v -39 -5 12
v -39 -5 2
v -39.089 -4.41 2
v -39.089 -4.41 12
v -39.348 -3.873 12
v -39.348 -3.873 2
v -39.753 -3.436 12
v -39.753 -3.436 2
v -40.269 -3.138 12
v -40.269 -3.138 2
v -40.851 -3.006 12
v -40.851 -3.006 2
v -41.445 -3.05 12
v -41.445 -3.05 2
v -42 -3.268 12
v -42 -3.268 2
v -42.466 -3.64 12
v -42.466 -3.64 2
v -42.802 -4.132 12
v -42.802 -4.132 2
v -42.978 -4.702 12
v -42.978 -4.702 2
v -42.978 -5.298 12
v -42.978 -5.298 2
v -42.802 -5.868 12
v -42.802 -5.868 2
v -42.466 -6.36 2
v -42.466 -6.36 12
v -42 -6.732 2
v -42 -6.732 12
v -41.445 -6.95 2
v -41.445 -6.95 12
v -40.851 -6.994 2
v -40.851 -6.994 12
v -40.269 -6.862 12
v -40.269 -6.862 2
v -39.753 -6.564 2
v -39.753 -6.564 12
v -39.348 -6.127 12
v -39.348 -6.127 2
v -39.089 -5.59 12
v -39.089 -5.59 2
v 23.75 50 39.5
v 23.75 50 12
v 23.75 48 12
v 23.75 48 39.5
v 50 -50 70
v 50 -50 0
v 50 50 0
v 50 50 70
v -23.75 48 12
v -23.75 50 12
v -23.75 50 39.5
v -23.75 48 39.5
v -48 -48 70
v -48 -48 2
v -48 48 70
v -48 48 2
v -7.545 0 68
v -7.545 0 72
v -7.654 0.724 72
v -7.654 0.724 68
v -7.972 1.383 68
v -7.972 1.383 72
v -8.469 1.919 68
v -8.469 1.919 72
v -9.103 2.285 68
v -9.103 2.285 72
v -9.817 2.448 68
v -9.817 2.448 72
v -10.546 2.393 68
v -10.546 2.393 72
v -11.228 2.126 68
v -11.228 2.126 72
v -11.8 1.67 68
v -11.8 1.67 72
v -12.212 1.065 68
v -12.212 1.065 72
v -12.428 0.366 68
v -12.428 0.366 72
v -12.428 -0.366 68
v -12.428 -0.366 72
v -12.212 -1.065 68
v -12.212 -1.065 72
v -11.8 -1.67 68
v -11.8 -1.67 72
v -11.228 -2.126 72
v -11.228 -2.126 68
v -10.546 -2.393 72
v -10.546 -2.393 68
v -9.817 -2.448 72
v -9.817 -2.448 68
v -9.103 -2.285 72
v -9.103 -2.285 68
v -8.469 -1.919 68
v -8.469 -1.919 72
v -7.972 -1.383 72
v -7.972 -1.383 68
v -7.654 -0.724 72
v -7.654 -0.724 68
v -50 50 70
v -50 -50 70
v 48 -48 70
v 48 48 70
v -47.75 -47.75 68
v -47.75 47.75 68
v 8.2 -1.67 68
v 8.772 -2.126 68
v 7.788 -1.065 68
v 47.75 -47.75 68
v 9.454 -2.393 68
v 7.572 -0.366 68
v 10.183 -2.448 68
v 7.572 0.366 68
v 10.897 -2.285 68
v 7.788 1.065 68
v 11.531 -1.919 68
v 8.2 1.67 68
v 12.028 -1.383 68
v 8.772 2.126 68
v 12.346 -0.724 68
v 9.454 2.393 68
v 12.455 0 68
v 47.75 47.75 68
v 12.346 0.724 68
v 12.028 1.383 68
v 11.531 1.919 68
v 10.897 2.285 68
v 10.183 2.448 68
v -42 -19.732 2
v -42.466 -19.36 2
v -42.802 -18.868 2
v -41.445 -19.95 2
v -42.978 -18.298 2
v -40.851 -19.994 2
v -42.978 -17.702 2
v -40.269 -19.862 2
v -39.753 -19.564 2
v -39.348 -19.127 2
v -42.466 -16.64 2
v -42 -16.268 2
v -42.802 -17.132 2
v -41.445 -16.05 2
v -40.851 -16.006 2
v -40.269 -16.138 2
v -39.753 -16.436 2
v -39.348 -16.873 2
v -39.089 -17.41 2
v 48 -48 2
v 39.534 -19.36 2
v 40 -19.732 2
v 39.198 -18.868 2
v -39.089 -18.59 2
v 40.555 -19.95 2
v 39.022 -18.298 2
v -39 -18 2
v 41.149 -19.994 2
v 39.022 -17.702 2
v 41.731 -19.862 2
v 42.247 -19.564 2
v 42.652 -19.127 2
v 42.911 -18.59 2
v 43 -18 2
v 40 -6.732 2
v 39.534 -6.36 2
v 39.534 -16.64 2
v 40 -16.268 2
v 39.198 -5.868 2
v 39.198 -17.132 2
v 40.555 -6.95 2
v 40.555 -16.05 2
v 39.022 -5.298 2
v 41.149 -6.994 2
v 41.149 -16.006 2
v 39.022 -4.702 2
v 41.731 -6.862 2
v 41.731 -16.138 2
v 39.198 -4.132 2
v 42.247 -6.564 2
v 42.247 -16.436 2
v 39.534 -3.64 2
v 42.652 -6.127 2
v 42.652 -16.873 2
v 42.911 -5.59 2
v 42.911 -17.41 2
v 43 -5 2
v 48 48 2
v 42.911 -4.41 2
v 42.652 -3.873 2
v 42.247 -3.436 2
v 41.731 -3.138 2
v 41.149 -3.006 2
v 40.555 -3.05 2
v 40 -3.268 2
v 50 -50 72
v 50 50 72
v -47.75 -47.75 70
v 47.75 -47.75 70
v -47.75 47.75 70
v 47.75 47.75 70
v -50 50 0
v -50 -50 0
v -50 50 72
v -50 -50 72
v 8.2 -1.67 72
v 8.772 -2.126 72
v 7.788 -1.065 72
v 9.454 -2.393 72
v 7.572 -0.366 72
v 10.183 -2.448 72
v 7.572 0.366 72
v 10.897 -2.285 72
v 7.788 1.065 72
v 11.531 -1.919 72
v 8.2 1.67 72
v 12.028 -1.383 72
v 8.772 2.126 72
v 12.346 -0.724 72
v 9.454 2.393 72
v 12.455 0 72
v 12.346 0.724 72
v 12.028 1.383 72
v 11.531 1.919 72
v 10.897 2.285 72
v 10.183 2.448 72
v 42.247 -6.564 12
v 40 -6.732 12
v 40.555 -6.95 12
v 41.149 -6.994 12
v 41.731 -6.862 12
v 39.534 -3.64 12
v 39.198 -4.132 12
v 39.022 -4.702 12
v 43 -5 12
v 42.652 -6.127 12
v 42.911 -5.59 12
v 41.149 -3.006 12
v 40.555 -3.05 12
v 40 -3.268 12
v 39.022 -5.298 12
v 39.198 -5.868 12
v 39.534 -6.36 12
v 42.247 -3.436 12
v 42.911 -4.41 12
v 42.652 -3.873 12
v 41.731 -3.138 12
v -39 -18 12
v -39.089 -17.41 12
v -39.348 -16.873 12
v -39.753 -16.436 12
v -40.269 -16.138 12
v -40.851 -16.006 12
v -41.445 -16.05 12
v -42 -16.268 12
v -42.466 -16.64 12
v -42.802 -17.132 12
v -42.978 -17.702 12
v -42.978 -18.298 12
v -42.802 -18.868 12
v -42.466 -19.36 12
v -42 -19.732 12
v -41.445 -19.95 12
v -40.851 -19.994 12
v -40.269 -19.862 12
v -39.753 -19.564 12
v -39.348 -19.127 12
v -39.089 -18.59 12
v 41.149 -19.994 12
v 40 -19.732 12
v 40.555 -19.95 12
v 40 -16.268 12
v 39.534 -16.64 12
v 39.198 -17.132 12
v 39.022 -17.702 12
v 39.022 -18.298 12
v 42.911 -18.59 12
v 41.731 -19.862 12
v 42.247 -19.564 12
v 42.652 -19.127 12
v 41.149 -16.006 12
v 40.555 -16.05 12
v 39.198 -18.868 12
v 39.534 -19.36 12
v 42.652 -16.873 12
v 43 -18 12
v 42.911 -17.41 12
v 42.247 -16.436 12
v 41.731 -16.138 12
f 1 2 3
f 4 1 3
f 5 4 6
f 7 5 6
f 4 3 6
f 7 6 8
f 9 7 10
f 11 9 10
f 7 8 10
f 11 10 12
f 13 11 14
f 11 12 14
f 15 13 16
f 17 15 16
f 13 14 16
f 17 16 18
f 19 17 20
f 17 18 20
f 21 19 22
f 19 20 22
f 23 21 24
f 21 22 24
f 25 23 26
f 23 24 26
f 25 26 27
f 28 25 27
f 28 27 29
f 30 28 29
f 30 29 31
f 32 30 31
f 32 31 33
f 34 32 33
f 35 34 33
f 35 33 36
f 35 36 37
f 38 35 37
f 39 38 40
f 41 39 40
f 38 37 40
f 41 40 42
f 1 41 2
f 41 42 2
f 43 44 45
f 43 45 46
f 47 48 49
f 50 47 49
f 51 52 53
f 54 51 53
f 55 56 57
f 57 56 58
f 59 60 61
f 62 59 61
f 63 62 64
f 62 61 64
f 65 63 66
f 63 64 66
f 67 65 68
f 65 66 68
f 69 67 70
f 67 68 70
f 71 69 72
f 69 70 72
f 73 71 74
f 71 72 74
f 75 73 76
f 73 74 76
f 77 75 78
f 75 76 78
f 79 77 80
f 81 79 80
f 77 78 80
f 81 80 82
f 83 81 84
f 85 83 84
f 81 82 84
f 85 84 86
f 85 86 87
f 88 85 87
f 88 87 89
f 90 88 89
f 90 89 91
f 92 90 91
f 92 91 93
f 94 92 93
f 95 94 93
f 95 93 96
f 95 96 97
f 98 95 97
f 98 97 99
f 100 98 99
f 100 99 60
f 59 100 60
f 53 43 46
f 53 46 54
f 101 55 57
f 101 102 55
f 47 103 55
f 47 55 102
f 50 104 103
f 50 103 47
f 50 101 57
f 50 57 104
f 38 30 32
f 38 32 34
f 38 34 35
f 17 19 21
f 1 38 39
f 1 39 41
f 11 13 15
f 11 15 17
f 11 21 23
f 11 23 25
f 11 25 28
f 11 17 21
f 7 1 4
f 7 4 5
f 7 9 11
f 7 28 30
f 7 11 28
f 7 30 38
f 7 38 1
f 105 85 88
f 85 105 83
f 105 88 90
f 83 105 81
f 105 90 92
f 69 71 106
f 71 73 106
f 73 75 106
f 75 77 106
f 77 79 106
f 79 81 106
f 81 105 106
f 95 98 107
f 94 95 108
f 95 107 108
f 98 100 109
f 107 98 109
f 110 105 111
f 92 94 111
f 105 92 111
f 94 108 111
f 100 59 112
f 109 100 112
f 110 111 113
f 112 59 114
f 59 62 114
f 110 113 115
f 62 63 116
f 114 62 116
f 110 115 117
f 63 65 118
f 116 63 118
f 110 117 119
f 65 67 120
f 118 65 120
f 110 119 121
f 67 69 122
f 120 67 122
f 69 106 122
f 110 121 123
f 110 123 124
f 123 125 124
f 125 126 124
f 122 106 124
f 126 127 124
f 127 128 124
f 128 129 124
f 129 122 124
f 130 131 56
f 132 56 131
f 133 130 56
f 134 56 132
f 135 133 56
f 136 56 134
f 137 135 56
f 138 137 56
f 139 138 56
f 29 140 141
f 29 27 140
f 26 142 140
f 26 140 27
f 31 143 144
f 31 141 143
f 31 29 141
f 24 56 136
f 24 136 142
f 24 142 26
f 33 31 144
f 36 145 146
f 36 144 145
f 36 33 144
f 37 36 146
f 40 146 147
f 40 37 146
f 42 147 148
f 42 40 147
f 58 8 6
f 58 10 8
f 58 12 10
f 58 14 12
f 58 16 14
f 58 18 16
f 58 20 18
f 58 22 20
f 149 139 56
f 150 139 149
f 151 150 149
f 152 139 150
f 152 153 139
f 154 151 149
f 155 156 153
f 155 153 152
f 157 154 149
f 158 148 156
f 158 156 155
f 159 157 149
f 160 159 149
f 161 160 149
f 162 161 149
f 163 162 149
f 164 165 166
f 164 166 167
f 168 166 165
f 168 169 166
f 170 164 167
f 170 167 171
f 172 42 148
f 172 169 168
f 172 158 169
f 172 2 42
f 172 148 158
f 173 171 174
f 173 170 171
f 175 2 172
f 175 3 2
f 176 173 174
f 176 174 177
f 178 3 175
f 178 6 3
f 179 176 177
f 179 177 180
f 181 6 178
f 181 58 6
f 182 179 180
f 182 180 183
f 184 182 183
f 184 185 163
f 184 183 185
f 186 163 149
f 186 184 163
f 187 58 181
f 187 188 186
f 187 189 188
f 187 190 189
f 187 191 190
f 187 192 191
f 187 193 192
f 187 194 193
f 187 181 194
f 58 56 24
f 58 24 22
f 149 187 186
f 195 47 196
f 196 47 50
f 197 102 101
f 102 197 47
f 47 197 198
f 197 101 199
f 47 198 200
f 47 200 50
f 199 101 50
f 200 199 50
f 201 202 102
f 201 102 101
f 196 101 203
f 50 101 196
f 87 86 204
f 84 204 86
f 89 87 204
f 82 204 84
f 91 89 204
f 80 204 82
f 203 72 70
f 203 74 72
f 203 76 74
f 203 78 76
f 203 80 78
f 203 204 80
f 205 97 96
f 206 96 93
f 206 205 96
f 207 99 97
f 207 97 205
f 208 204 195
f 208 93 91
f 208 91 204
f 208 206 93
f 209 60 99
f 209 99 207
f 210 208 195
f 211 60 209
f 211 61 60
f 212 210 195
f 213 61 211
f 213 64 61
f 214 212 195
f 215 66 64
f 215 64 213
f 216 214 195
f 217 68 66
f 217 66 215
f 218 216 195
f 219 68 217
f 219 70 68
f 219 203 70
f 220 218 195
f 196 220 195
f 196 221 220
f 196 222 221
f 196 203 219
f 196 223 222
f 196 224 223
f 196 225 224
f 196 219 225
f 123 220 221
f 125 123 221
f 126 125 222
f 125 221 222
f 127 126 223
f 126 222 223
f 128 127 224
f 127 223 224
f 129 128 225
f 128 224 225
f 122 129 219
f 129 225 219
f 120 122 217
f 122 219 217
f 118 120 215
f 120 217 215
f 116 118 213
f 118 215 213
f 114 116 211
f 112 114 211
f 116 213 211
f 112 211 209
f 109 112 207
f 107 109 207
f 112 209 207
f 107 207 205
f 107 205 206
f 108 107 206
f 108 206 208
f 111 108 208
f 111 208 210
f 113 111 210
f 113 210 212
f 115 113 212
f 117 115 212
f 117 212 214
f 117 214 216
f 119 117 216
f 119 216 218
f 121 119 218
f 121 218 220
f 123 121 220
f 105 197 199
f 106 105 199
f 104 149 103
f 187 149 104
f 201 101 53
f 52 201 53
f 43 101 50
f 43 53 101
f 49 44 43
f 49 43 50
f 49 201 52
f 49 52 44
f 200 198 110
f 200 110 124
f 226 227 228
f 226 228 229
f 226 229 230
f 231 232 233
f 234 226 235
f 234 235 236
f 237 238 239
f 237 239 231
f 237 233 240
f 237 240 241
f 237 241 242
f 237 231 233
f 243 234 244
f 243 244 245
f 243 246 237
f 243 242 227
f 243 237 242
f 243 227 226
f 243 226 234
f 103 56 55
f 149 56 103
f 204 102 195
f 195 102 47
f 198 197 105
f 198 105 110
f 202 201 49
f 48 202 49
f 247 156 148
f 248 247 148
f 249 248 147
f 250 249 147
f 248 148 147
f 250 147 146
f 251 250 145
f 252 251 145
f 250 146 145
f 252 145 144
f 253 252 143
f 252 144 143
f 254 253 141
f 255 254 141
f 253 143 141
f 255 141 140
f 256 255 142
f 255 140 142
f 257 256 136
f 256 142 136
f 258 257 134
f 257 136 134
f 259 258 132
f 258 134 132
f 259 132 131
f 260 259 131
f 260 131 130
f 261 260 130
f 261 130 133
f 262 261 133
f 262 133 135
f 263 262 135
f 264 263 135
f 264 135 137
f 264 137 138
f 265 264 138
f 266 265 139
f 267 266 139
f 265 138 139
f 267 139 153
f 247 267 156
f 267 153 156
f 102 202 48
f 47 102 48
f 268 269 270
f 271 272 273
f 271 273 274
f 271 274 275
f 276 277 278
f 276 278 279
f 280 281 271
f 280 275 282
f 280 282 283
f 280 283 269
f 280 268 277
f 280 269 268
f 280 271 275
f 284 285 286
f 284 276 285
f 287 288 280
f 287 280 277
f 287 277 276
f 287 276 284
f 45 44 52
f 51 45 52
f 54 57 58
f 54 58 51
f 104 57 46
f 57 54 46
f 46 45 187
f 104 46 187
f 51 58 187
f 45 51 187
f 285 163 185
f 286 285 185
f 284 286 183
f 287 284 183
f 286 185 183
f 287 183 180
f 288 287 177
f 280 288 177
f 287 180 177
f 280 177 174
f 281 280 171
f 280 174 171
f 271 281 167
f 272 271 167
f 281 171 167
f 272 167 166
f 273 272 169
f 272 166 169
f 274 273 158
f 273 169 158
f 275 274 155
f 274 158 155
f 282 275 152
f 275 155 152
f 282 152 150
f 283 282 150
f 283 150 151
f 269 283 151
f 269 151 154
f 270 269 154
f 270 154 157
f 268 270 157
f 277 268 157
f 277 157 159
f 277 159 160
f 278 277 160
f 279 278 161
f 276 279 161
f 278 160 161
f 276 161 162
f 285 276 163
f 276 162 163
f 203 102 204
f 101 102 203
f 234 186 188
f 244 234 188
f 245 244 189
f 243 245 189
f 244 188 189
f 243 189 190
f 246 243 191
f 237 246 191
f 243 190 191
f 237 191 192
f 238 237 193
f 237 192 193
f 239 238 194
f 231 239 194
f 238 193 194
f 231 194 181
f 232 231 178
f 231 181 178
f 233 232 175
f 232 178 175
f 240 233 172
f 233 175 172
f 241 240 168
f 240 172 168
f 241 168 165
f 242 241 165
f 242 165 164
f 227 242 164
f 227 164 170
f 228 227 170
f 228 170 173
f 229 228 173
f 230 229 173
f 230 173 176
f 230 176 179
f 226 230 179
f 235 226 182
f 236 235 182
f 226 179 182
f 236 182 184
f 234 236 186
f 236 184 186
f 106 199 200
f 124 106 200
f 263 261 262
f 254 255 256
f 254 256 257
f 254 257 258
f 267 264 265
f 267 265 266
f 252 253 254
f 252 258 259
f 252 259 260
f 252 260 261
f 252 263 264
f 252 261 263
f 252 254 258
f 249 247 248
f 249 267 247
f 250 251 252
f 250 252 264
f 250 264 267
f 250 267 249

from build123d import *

# Parameters (mm, degrees)
F0_W      = 100
F0_H      = 100
F1_DEPTH  = 70
F2_T      = -2
F3_R      = 2
F4_DEPTH  = 10
F5_W      = 47.5
F5_H      = 27.5
F6_DEPTH  = 25
F7_W      = 95.5
F7_H      = 95.5
F8_DEPTH  = 2
F9_W      = 100
F9_H      = 100
F10_DEPTH = 2
F11_R     = 2.455
F12_DEPTH = 25


with BuildPart() as f1:
    # F0 (on Top) → F1 (new body)
    with BuildSketch(Plane.XY):
        Rectangle(F0_W, F0_H)
    extrude(amount=F1_DEPTH)

    # F2
    f2_openings = [f1.faces().sort_by_distance(p)[0] for p in [
        (0, 0, 70),
    ]]
    offset(amount=F2_T, openings=f2_openings)

    # F3 (on face) → F4 (join)
    with BuildSketch(Plane.XY.offset(2)):
        with Locations((-41, -5)):
            Circle(F3_R)
        with Locations((-41, -18)):
            Circle(F3_R)
        with Locations((41, -5)):
            Circle(F3_R)
        with Locations((41, -18)):
            Circle(F3_R)
    extrude(amount=F4_DEPTH)

    # F5 (on face) → F6 (cut)
    with BuildSketch(Plane(origin=(0, 50, 0), x_dir=(-1, 0, 0), z_dir=(0, 1, 0))):
        with Locations((0, 25.75)):
            Rectangle(F5_W, F5_H)
    extrude(amount=-F6_DEPTH, mode=Mode.SUBTRACT)


with BuildPart() as f8:
    # F7 (on face) → F8 (new body)
    with BuildSketch(Plane.XY.offset(70)):
        Rectangle(F7_W, F7_H)
    extrude(amount=-F8_DEPTH)

    # F9 (on face) → F10 (join)
    with BuildSketch(Plane.XY.offset(70)):
        Rectangle(F9_W, F9_H)
    extrude(amount=F10_DEPTH)

    # F11 (on face) → F12 (cut)
    with BuildSketch(Plane.XY.offset(72)):
        with Locations((10, 0)):
            Circle(F11_R)
        with Locations((-10, 0)):
            Circle(F11_R)
    extrude(amount=-F12_DEPTH, mode=Mode.SUBTRACT)


solid = Compound([f1.part, f8.part])
